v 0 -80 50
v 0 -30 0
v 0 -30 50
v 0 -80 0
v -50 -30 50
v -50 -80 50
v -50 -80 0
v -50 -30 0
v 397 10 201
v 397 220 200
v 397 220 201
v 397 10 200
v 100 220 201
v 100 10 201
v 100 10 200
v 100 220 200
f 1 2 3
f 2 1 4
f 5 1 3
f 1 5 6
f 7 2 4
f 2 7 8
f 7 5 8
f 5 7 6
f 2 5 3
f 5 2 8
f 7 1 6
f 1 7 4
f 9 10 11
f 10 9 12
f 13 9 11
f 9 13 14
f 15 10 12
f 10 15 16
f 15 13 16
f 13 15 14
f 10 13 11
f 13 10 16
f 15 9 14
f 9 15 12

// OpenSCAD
case_width  = 460;
case_depth  = 330;
case_height = 160;

case_lid_ext_width  = 460;
case_lid_ext_depth  = 330;
case_lid_ext_height = 60;
case_lid_int_width  = case_lid_ext_width - (8.9 * 2);
case_lid_int_depth  = case_lid_ext_depth - (8.9 * 2);
case_lid_int_height = 51.0;

case_bottom_ext_width  = 460;
case_bottom_ext_depth  = 330;
case_bottom_ext_height = 100;
case_bottom_int_width  = case_bottom_ext_width - (11.0*2);
case_bottom_int_depth  = case_bottom_ext_depth - (11.0*2);
case_bottom_int_height = 92.0;

A4_width = 210;
A4_depth = 297;

module reference_object()
{
	translate([-50,-80,0])
	{
		cube(size = [50,50,50], center = false);
	}
}

module suitcase()
{
	
}

module a4_bed()
{
	translate([100,10,200])
	{
		cube(size=[A4_depth,A4_width,1]);
	}
}

module draw()
{
	suitcase();
	reference_object();
	
	a4_bed();
}

draw();
